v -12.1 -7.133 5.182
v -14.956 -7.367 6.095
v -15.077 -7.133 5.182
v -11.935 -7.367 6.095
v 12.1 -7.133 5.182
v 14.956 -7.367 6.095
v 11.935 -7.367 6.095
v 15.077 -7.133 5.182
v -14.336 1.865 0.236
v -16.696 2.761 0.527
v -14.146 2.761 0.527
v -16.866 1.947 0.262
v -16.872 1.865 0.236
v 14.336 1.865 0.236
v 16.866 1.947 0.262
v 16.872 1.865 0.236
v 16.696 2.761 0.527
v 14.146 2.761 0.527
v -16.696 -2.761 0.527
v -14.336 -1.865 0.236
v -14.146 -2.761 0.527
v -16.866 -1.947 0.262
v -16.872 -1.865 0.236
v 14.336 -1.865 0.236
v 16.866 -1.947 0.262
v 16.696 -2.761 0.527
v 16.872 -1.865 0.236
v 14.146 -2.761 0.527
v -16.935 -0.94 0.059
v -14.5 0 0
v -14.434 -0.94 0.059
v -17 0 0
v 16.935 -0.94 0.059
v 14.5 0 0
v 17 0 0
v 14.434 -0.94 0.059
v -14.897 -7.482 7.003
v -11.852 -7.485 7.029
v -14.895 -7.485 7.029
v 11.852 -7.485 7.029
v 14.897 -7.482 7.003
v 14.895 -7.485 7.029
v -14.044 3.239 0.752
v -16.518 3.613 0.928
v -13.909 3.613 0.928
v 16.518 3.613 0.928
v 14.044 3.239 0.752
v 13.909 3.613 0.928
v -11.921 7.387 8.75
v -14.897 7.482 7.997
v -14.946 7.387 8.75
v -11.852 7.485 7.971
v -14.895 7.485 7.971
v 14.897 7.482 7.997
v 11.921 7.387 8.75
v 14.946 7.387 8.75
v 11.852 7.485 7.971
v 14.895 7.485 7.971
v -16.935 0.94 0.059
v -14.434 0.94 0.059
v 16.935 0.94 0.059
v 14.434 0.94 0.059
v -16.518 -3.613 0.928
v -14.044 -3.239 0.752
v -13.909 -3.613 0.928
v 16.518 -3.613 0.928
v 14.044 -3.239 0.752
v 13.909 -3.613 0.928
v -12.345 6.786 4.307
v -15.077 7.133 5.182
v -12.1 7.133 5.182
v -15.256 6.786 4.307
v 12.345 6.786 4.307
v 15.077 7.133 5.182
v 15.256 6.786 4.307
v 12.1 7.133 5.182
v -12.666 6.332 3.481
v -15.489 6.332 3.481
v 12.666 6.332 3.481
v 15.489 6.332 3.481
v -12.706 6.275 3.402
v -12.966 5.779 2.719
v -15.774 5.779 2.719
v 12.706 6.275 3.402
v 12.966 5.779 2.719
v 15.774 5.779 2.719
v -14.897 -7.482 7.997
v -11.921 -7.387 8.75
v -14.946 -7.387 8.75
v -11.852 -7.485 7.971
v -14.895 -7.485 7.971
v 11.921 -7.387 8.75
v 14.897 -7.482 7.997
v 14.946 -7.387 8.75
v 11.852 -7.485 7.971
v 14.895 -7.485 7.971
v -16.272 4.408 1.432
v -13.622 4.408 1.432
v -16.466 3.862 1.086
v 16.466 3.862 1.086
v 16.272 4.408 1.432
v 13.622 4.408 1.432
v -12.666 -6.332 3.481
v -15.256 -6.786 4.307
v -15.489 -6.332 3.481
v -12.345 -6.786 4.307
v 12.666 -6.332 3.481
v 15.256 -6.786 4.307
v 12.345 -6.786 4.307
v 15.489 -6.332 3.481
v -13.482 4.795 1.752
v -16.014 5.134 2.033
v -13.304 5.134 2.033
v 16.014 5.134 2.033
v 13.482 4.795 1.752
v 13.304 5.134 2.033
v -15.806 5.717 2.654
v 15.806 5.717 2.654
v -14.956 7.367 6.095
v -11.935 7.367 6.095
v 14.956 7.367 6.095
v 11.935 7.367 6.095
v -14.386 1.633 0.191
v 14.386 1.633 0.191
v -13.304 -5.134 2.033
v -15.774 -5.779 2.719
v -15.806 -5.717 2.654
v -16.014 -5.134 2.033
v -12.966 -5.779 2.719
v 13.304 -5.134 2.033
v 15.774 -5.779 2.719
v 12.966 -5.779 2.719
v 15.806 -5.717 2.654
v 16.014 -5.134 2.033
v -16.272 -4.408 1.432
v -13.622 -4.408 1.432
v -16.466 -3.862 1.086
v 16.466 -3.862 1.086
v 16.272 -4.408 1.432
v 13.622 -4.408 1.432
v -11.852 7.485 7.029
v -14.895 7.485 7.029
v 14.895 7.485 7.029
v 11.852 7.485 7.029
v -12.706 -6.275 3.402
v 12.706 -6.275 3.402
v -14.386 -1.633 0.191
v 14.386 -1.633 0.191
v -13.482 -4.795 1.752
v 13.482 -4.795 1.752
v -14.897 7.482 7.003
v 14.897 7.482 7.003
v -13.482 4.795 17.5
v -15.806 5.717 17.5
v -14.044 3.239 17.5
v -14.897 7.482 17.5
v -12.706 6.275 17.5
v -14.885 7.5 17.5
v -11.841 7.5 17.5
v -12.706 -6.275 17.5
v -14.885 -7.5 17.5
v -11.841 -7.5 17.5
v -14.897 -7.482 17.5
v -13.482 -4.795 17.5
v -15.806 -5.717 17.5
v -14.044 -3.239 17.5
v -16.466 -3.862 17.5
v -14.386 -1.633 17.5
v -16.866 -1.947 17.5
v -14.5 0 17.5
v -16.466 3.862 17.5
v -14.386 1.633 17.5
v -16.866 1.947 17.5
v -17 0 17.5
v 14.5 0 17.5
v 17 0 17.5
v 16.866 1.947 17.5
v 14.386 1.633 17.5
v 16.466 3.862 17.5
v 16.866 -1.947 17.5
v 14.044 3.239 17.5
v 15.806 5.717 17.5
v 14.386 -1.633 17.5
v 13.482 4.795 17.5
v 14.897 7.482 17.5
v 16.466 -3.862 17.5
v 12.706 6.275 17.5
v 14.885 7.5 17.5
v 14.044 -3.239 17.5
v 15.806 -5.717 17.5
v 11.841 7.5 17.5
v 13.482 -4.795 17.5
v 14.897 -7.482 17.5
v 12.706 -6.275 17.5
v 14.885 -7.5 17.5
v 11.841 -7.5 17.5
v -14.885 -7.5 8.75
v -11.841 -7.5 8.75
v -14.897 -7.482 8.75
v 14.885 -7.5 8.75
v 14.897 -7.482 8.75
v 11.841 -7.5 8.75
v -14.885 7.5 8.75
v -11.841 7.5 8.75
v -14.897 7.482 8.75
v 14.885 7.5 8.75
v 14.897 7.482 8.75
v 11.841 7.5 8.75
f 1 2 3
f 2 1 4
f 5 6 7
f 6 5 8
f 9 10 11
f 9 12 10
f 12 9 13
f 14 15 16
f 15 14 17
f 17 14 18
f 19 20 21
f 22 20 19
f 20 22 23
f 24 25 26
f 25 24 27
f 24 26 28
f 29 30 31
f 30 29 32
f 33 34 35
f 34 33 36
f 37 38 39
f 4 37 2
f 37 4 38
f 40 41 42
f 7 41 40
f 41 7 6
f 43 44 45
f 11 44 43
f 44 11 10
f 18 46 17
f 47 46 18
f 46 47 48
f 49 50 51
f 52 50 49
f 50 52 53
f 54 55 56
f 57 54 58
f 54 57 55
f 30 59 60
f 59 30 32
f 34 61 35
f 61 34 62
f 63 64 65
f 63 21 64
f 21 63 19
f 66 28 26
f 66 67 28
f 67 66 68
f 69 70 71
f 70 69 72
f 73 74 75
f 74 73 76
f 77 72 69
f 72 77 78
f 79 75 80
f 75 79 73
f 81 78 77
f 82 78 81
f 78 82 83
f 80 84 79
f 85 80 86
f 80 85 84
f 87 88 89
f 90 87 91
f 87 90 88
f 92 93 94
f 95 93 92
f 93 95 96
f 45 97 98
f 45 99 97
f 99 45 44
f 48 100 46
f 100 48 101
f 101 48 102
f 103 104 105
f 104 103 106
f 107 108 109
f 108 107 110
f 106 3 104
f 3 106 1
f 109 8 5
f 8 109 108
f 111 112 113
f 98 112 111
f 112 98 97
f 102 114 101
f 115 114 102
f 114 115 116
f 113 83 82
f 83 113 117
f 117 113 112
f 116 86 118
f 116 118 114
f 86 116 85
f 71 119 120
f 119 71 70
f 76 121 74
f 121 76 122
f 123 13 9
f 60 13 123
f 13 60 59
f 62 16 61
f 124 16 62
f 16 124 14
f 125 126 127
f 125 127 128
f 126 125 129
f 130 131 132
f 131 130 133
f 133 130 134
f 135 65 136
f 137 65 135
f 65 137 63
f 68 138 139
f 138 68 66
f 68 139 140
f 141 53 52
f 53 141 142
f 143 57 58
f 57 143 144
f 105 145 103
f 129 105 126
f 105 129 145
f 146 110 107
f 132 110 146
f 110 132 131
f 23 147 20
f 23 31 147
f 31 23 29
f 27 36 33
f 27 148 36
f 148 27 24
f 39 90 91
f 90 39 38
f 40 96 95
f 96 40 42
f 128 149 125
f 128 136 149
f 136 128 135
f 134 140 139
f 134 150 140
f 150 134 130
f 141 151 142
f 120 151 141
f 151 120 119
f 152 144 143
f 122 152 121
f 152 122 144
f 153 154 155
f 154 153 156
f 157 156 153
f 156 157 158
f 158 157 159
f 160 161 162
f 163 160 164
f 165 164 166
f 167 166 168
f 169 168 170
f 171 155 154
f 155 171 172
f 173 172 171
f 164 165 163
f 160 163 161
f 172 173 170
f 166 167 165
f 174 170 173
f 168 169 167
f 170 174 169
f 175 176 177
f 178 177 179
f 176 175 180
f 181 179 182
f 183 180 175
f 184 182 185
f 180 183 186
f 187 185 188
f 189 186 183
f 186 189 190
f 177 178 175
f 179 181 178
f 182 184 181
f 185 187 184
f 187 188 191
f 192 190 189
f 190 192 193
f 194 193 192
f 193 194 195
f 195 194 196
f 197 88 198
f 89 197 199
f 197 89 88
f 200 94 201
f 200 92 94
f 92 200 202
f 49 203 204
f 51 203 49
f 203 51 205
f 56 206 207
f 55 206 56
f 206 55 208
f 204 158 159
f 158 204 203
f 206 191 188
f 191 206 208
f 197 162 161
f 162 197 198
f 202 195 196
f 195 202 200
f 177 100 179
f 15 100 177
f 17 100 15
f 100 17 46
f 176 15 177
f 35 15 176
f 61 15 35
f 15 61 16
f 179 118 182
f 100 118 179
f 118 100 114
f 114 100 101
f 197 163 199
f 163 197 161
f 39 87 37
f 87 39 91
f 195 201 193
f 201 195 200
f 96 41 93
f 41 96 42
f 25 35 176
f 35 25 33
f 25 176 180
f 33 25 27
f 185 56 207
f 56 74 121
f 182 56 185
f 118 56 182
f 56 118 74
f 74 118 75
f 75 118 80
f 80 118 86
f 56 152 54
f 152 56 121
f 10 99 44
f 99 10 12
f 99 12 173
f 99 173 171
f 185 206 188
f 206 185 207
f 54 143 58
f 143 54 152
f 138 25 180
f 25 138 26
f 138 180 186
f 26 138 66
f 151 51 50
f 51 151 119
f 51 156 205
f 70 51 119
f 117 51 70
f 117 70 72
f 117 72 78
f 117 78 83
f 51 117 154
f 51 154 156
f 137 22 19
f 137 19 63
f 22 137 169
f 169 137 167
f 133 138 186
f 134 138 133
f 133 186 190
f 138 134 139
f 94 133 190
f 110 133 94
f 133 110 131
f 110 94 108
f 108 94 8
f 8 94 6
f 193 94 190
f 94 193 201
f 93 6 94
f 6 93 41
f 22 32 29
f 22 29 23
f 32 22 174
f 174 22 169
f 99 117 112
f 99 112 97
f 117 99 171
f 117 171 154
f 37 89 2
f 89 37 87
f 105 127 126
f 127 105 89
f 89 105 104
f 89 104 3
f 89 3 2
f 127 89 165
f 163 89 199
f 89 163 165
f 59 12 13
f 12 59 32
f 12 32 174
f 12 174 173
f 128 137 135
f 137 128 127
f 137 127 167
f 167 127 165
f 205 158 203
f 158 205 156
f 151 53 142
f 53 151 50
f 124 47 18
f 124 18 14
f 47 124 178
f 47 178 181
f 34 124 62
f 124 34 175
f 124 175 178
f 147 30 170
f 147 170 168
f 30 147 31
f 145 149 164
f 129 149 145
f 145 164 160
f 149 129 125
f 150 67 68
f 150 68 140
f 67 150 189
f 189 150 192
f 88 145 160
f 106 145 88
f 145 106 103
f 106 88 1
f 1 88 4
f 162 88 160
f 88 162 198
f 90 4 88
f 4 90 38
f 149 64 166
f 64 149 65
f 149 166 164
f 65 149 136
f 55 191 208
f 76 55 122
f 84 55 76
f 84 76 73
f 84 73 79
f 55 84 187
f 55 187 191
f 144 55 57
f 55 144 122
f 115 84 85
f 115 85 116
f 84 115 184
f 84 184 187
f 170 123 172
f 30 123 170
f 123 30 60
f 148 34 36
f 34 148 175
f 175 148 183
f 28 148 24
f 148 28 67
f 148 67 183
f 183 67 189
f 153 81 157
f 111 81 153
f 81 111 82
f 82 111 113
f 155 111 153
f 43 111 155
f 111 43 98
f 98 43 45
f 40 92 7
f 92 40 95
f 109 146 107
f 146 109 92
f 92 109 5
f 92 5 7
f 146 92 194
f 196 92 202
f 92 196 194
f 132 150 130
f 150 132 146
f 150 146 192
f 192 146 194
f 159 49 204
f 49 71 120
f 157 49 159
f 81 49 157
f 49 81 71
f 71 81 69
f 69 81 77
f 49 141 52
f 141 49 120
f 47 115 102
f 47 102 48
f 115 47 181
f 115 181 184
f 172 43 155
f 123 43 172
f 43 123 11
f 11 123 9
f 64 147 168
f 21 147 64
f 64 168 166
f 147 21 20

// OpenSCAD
$fn = 50;

ancho = 34;
profundo = 31;
alto = 17.5;
grosor = 2.5;
profundo_cortado = 15;

intersection () {
    union() {
        translate([-ancho/2, 0, profundo_cortado/2]) rotate([0, 90, 0]) cylinder(ancho, d = profundo_cortado);
        translate([0, 0, 3*alto/4]) cube([ancho, profundo_cortado, alto/2], true);
    }

    intersection() {
        cilindro_estirado_hueco(ancho, profundo, alto, grosor);
        translate([-ancho/2, -profundo_cortado/2]) cube([ancho, profundo_cortado, alto]);
    }
}

module cilindro_estirado_hueco(ancho, profundo, alto, grosor) {
    difference() {
        cilindro_estirado (ancho, profundo, alto);
        cilindro_estirado (ancho - 2 * grosor, profundo - 2 * grosor, alto );
    }
}


module cilindro_estirado (ancho, profundo, alto) {
    resize([ancho, profundo, alto]) cylinder(10, d = 10);
}
